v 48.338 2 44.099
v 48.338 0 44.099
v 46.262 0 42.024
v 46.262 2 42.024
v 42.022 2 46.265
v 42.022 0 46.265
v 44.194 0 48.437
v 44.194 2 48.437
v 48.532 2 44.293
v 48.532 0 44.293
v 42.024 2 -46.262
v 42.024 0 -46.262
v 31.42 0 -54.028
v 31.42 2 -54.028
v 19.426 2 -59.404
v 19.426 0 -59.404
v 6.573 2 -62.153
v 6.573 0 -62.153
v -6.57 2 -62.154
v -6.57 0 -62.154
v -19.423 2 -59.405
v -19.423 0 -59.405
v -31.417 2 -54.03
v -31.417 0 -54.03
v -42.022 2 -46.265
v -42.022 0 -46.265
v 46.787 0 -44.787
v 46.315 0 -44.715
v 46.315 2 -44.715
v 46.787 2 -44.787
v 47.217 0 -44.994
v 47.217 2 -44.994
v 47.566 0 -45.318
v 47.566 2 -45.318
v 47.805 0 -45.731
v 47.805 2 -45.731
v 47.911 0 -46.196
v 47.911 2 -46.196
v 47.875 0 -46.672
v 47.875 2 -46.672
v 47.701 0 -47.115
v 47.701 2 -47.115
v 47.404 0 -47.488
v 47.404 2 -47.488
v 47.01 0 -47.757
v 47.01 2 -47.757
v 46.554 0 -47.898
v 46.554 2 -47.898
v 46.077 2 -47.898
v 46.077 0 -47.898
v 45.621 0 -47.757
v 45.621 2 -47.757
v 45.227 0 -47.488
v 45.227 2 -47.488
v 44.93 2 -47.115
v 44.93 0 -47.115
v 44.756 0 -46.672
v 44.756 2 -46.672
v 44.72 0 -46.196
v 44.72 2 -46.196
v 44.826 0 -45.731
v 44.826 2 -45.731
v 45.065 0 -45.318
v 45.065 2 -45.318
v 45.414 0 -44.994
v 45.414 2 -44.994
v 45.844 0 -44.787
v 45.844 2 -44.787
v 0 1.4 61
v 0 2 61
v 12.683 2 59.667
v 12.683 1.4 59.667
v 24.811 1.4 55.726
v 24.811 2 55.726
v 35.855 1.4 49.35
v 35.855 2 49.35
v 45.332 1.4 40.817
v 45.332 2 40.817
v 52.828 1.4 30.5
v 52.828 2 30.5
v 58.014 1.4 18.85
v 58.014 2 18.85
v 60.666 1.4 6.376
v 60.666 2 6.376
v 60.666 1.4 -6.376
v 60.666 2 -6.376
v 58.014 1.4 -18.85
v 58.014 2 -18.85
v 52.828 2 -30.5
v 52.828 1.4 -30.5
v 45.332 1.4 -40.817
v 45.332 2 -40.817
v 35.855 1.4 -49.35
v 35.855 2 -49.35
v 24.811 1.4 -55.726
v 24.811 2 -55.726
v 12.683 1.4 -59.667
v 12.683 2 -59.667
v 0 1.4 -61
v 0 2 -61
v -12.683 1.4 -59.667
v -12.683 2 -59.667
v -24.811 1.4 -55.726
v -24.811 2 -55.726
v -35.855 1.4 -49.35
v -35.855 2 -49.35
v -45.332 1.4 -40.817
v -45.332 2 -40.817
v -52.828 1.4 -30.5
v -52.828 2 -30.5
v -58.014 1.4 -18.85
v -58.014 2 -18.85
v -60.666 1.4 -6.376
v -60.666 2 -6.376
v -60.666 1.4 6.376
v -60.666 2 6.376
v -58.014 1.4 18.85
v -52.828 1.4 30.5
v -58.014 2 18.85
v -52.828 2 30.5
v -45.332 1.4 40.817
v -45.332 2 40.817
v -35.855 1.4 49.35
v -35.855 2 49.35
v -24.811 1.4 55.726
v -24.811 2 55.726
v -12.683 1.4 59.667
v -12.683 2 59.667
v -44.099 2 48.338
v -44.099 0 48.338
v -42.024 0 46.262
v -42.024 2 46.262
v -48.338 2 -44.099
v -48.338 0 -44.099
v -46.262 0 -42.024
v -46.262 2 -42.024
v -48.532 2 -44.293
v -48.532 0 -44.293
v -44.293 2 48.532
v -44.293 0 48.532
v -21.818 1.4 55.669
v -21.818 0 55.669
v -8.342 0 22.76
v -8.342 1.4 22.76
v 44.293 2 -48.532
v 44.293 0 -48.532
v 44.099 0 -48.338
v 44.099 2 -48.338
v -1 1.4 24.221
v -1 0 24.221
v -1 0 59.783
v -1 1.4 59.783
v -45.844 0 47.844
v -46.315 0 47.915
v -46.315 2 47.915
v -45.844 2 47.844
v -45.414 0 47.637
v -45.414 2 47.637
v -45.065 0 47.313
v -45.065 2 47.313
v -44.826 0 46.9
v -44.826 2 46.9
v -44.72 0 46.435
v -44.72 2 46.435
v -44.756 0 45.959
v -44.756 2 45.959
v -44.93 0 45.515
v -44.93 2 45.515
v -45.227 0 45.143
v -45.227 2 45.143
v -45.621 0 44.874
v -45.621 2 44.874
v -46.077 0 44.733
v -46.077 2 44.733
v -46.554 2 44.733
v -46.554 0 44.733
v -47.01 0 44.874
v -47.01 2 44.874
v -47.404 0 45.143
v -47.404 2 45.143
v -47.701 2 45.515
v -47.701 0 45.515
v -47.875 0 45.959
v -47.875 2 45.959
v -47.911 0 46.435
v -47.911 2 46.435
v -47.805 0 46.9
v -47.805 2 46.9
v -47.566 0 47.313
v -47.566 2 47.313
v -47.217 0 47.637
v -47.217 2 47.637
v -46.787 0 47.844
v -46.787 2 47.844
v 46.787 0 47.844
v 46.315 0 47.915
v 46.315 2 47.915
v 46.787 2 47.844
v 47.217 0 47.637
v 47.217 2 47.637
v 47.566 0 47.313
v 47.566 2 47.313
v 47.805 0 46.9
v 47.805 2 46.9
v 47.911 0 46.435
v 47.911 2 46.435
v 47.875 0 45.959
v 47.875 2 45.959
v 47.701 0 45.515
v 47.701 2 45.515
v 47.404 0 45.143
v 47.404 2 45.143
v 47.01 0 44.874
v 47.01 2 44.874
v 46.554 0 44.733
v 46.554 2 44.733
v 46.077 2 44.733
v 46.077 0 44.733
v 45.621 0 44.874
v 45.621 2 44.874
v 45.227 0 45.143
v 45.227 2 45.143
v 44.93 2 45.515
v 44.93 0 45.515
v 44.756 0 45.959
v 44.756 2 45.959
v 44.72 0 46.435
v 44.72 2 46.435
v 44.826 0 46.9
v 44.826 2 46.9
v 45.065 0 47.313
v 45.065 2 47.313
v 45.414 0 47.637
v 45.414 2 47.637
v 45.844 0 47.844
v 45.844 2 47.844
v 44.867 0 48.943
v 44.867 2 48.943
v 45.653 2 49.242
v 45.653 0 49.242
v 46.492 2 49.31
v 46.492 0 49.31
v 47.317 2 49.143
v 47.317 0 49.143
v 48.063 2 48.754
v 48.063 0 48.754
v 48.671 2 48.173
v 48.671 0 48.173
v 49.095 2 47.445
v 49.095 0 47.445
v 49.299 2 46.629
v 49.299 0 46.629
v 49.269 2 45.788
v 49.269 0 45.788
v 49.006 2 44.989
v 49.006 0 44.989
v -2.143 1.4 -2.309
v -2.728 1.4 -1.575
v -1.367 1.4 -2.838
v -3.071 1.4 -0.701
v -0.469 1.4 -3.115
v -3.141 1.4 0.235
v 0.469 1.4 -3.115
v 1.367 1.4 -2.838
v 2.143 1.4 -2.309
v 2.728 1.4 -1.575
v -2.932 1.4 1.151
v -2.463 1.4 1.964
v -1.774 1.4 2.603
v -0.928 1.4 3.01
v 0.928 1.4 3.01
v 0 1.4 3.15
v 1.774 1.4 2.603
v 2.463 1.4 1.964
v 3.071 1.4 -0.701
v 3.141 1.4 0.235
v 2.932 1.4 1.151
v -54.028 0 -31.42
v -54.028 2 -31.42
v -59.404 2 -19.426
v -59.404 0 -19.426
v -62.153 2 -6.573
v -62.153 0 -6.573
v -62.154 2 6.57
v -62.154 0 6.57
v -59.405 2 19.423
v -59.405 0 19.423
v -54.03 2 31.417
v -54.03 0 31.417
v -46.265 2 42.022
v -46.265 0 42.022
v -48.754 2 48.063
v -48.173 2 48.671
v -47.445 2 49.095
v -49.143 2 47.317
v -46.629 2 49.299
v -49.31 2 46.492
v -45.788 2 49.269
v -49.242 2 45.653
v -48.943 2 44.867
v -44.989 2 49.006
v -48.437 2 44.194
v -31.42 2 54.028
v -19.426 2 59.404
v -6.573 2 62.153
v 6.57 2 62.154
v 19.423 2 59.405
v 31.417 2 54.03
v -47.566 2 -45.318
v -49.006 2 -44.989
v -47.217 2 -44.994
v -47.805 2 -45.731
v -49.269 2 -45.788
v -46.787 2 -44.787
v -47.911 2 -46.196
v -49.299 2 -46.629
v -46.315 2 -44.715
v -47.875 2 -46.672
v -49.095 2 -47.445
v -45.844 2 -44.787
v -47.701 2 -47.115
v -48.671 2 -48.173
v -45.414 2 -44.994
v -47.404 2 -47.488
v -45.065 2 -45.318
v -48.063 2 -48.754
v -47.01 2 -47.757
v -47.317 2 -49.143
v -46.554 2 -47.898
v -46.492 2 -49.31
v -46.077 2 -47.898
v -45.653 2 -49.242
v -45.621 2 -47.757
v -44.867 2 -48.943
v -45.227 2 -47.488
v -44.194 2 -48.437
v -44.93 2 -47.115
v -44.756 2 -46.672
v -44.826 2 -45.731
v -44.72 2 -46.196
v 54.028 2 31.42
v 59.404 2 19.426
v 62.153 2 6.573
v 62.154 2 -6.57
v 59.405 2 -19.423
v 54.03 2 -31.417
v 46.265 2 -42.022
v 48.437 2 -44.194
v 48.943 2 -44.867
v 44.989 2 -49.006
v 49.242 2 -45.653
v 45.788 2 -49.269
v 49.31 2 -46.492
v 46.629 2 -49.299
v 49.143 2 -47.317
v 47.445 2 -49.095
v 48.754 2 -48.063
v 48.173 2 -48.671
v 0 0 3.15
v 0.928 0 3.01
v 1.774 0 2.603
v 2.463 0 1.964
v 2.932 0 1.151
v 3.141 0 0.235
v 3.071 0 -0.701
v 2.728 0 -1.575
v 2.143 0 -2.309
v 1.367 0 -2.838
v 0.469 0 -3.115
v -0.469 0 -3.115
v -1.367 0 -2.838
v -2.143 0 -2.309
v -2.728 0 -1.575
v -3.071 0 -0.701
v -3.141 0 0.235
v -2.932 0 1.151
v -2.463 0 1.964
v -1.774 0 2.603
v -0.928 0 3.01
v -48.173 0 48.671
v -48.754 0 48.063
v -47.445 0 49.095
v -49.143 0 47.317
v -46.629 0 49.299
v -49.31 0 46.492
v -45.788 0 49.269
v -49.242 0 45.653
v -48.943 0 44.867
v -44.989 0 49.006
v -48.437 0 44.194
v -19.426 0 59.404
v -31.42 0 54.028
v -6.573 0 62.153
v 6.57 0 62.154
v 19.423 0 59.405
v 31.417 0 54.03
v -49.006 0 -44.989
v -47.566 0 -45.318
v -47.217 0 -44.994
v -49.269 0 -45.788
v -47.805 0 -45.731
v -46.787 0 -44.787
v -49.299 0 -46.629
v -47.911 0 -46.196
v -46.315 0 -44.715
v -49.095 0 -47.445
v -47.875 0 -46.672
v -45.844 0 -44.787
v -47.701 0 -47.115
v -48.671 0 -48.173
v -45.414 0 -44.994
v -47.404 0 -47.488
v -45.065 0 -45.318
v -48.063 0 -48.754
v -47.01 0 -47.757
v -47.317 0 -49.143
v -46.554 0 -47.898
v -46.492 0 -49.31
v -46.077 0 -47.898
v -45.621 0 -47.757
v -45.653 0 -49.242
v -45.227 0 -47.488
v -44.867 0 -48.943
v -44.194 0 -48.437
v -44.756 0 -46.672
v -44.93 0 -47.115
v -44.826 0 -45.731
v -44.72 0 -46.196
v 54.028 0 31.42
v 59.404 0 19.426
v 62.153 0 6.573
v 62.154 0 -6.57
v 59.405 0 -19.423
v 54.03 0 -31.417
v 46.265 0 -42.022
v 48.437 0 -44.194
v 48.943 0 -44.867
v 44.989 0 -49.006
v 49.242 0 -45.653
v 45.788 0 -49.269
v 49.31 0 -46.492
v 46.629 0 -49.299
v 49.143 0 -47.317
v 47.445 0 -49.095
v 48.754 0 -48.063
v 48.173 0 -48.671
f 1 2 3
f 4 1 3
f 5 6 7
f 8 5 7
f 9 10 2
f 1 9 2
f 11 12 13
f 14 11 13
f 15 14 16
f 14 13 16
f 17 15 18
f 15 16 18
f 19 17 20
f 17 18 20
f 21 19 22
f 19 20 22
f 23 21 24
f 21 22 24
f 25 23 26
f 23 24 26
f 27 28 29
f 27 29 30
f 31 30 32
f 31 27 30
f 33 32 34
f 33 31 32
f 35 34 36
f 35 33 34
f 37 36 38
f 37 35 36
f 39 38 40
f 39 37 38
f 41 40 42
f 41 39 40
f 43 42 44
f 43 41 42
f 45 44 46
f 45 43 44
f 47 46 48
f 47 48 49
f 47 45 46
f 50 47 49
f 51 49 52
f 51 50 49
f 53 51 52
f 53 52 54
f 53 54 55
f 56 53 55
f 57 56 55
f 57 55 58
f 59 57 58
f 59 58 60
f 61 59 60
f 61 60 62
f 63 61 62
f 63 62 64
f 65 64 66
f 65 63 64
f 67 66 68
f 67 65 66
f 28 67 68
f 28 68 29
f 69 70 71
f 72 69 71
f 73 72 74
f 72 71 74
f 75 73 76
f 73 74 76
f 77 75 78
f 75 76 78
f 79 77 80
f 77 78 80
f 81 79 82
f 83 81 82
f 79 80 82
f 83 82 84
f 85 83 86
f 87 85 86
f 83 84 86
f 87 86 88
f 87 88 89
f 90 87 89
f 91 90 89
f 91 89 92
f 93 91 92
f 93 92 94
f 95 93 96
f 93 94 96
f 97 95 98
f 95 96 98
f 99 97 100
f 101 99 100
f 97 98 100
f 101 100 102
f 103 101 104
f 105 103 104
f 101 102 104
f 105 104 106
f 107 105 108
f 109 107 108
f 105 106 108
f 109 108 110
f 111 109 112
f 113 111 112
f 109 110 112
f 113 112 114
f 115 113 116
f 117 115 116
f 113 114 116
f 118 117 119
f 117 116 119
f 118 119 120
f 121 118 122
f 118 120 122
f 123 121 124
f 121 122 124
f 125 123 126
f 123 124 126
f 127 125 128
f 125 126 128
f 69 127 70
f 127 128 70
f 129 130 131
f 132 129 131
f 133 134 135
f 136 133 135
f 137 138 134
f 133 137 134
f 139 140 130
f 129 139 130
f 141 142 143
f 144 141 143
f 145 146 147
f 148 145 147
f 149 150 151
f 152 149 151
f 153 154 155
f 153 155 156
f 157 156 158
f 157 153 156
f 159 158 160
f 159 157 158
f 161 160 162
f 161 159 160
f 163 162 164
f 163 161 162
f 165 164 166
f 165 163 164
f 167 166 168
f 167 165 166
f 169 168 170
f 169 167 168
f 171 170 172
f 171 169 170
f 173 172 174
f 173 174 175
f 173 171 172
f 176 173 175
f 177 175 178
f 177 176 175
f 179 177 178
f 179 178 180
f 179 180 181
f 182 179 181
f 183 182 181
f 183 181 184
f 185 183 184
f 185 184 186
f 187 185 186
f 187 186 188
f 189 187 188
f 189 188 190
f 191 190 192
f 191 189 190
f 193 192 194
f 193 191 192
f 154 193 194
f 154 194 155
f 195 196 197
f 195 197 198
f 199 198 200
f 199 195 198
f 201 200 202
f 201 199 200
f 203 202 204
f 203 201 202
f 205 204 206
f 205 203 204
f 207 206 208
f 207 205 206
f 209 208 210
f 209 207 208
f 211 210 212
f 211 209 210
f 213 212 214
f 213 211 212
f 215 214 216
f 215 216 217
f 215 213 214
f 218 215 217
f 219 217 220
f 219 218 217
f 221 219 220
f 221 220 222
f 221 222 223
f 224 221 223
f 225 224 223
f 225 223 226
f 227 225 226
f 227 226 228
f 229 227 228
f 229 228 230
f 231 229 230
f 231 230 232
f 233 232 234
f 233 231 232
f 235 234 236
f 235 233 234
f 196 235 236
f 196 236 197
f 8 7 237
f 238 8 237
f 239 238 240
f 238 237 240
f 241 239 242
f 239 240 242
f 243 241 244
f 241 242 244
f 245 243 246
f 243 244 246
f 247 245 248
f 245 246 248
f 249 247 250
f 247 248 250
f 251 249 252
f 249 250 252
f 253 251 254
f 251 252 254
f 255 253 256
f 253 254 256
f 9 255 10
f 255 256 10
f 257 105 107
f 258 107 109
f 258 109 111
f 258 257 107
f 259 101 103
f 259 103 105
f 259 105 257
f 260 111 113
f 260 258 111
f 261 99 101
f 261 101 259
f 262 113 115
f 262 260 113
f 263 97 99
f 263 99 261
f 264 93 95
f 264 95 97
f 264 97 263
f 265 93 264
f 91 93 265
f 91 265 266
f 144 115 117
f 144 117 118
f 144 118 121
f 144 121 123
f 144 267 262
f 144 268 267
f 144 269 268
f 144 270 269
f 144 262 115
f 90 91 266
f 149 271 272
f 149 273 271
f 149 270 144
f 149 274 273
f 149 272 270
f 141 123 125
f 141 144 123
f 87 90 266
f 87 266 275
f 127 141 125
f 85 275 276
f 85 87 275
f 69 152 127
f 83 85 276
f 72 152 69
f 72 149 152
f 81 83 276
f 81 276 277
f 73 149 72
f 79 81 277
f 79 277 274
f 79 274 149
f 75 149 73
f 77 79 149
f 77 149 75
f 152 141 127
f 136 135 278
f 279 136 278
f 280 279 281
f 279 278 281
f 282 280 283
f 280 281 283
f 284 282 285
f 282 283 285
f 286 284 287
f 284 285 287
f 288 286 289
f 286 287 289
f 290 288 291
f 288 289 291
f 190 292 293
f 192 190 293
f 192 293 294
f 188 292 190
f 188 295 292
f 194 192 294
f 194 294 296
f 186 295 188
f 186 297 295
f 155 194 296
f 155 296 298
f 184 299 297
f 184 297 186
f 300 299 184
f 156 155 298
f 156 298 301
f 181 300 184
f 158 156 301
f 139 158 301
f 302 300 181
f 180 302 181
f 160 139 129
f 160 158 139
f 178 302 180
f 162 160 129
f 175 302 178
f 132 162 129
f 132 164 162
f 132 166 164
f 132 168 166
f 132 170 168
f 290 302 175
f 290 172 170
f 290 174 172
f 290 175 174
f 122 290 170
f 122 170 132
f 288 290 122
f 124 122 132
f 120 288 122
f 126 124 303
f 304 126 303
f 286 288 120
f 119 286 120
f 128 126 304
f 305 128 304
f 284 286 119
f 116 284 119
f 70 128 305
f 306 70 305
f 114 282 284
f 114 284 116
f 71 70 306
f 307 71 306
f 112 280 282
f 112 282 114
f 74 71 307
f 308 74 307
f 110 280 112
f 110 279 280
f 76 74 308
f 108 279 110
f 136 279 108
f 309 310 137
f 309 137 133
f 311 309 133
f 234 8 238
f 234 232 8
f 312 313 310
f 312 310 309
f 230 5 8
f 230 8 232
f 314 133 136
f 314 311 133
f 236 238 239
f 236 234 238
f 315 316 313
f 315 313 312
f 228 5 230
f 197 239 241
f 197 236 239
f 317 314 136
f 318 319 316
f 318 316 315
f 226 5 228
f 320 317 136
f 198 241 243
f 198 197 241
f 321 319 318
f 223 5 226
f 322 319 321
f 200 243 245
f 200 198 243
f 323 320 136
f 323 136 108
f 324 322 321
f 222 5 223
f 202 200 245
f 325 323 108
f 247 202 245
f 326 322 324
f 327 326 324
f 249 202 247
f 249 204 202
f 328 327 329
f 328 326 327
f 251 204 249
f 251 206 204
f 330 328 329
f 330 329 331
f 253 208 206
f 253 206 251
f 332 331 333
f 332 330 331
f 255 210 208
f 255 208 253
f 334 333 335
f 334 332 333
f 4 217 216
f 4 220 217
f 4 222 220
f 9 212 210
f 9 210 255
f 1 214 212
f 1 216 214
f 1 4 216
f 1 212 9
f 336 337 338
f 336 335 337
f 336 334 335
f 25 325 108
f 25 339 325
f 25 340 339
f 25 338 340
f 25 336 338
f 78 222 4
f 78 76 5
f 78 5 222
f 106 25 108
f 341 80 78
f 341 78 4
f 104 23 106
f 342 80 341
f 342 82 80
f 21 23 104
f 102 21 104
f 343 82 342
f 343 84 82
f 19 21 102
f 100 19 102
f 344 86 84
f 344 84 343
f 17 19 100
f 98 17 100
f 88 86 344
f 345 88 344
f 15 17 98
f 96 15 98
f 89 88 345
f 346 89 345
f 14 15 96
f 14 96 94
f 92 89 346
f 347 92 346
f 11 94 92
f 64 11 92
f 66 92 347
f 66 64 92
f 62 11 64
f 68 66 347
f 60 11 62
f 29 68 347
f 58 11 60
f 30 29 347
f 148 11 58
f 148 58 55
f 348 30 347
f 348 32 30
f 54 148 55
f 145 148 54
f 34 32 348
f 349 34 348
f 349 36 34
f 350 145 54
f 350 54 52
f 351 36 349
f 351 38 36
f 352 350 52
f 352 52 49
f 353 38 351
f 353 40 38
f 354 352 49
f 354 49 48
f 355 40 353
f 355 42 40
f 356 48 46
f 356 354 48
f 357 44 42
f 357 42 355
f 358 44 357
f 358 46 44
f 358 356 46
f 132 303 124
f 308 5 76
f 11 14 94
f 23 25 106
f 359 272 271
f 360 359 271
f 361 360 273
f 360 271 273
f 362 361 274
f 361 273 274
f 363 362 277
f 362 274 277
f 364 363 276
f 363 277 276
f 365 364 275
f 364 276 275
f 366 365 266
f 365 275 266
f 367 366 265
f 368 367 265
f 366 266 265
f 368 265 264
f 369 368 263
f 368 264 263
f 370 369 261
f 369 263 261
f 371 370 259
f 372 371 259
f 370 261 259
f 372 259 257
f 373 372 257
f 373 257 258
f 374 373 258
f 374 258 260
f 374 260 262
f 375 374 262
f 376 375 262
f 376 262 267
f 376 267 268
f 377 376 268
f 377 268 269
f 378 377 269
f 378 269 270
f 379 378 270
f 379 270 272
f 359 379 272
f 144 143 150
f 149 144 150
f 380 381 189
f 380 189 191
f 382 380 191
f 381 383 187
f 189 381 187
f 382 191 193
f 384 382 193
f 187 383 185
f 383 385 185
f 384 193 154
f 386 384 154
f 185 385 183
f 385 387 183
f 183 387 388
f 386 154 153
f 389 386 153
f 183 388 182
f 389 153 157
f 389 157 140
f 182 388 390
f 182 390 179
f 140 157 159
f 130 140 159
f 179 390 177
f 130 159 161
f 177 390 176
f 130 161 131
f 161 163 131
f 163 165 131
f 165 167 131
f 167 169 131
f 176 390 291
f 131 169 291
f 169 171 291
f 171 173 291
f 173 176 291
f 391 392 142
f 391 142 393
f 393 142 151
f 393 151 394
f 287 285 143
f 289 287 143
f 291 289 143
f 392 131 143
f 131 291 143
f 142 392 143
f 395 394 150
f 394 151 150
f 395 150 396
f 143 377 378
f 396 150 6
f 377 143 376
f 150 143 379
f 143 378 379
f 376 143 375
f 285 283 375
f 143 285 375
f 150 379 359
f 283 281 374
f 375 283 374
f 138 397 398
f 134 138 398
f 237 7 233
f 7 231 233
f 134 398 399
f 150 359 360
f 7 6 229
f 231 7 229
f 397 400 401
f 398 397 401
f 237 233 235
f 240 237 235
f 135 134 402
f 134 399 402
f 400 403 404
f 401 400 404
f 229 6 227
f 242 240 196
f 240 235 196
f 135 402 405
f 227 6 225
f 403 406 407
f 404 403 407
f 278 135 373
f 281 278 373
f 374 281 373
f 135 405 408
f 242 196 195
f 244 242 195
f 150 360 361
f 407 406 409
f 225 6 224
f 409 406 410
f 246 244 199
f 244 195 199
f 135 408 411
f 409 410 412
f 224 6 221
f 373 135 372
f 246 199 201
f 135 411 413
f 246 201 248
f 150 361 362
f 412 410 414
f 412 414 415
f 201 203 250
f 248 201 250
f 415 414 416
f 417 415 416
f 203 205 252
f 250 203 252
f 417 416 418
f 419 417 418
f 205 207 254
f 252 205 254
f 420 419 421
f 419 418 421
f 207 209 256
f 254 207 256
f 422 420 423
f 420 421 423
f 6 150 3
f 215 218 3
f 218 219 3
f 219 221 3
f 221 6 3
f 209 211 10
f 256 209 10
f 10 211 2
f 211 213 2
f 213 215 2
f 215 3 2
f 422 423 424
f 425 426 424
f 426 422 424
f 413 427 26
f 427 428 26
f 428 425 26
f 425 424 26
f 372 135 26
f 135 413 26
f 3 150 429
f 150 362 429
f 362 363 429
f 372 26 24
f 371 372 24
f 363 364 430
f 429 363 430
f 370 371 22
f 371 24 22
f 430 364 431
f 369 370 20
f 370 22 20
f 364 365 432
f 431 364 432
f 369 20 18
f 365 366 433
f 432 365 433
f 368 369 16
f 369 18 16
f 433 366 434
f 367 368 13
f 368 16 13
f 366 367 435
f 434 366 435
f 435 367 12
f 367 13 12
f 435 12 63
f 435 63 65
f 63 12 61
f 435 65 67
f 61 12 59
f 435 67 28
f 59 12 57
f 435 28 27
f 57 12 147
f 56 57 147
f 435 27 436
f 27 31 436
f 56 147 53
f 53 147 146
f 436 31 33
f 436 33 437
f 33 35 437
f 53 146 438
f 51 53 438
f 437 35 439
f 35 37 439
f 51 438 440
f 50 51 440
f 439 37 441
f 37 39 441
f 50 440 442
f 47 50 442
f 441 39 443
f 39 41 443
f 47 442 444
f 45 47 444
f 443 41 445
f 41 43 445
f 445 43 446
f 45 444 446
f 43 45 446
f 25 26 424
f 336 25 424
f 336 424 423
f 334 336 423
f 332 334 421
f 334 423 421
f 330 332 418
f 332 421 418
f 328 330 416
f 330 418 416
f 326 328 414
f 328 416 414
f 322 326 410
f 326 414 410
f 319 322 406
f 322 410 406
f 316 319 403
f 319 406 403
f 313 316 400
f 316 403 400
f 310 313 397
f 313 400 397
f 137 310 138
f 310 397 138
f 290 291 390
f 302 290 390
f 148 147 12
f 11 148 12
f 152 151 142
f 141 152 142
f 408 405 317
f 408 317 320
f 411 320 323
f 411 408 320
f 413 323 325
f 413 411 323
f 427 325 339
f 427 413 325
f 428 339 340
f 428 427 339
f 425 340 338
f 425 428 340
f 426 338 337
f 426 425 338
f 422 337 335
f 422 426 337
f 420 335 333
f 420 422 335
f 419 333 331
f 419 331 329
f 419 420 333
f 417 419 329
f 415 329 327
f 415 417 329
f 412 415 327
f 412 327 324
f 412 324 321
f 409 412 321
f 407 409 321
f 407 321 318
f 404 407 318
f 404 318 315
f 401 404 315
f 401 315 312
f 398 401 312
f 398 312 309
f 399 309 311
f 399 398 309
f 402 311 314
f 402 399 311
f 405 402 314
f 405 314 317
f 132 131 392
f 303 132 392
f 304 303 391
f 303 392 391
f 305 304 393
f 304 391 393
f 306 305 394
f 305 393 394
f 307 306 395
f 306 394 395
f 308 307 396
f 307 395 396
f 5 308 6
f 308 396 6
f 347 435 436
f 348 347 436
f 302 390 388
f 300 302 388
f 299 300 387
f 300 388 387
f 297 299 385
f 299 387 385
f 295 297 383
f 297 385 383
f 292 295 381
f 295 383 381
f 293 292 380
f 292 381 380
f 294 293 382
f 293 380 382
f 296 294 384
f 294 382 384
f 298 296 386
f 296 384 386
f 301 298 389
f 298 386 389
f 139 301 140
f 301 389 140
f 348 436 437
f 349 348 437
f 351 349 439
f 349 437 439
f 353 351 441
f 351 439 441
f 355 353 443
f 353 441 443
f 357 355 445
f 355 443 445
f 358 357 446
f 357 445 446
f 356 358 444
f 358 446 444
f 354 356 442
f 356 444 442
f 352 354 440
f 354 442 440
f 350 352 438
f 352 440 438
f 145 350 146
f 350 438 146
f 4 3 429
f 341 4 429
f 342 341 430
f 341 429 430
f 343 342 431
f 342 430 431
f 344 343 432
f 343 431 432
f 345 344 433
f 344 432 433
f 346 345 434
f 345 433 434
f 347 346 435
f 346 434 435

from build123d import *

# Parameters (mm, degrees)
SKETCH_1_R               = 1.6
EXTRUDE_1_DEPTH          = 2
SKETCH_2_R               = 61
CUT_EXTRUDE_3_DEPTH      = 0.6
SKETCH_3_R               = 3.15
CUT_EXTRUDE_4_DEPTH      = 2
CUT_EXTRUDE_6_DEPTH      = 56
CUT_EXTRUDE_6_DEPTH_BACK = 58


with BuildPart() as part:
    # Эскиз1 → Бобышка-Вытянуть1 (new body)
    with BuildSketch(Plane(origin=(0, 0, 0), x_dir=(1, 0, 0), z_dir=(0, 1, 0))):
        with BuildLine():
            ThreePointArc((-44.194173824, 48.436814511), (-48.387717364, 48.484800745), (-48.531650935, 44.293453322))
            Line((-48.531650935, 44.293453322), (-48.337535014, 44.0993374))
            Line((-48.337535014, 44.0993374), (-46.262438284, 42.024240671))
            ThreePointArc((-46.262438284, 42.024240671), (-62.49999998, 0.001572675), (-46.264553121, -42.021912433))
            Line((-46.264553121, -42.021912433), (-48.436814511, -44.194173824))
            ThreePointArc((-48.436814511, -44.194173824), (-48.484800745, -48.387717364), (-44.293453322, -48.531650935))
            Line((-44.293453322, -48.531650935), (-44.0993374, -48.337535014))
            Line((-44.0993374, -48.337535014), (-42.024240671, -46.262438284))
            ThreePointArc((-42.024240671, -46.262438284), (-0.001572675, -62.49999998), (42.021912433, -46.264553121))
            Line((42.021912433, -46.264553121), (44.194173824, -48.436814511))
            ThreePointArc((44.194173824, -48.436814511), (48.387717364, -48.484800745), (48.531650935, -44.293453322))
            Line((48.531650935, -44.293453322), (48.337535014, -44.0993374))
            Line((48.337535014, -44.0993374), (46.262438284, -42.024240671))
            ThreePointArc((46.262438284, -42.024240671), (62.49999998, -0.001572675), (46.264553121, 42.021912433))
            Line((46.264553121, 42.021912433), (48.436814511, 44.194173824))
            ThreePointArc((48.436814511, 44.194173824), (48.484800745, 48.387717364), (44.293453322, 48.531650935))
            Line((44.293453322, 48.531650935), (44.0993374, 48.337535014))
            Line((44.0993374, 48.337535014), (42.024240671, 46.262438284))
            ThreePointArc((42.024240671, 46.262438284), (0.001572675, 62.49999998), (-42.021912433, 46.264553121))
            Line((-42.021912433, 46.264553121), (-44.194173824, 48.436814511))
        make_face()
        with Locations(Location((-46.315494168, -46.315494168, 0), (0, 0, 270))):
            Circle(SKETCH_1_R, mode=Mode.SUBTRACT)
        with Locations(Location((46.315494168, -46.315494168, 0), (0, 0, 270))):
            Circle(SKETCH_1_R, mode=Mode.SUBTRACT)
        with Locations(Location((-46.315494168, 46.315494168, 0), (0, 0, 270))):
            Circle(SKETCH_1_R, mode=Mode.SUBTRACT)
        with Locations(Location((46.315494168, 46.315494168, 0), (0, 0, 270))):
            Circle(SKETCH_1_R, mode=Mode.SUBTRACT)
    extrude(amount=EXTRUDE_1_DEPTH)

    # Эскиз2 → Вырез-Вытянуть3 (cut)
    with BuildSketch(Plane(origin=(0, 2, 0), x_dir=(1, 0, 0), z_dir=(0, 1, 0))):
        with Locations(Location((0, 0, 0), (0, 0, 270))):
            Circle(SKETCH_2_R)
    extrude(amount=-CUT_EXTRUDE_3_DEPTH, mode=Mode.SUBTRACT)

    # Эскиз3 → Вырез-Вытянуть4 (cut)
    with BuildSketch(Plane(origin=(0, 1.4, 0), x_dir=(1, 0, 0), z_dir=(0, 1, 0))):
        with Locations(Location((0, 0, 0), (0, 0, 270))):
            Circle(SKETCH_3_R)
    extrude(amount=-CUT_EXTRUDE_4_DEPTH, mode=Mode.SUBTRACT)

    # Эскиз6 → Вырез-Вытянуть6 (cut, two sides: drawn at the far end of the back side and taken through both)
    with BuildSketch(Plane(origin=(0, 0, 0), x_dir=(1, 0, 0), z_dir=(0, 1, 0)).offset(-CUT_EXTRUDE_6_DEPTH_BACK)):
        Polygon((-21.818311129, -55.668605856), (-8.341675093, -22.760328818), (-1, -24.220678791), (-1, -59.783022844), align=None)
    extrude(amount=CUT_EXTRUDE_6_DEPTH + CUT_EXTRUDE_6_DEPTH_BACK, mode=Mode.SUBTRACT)


solid = part.part
